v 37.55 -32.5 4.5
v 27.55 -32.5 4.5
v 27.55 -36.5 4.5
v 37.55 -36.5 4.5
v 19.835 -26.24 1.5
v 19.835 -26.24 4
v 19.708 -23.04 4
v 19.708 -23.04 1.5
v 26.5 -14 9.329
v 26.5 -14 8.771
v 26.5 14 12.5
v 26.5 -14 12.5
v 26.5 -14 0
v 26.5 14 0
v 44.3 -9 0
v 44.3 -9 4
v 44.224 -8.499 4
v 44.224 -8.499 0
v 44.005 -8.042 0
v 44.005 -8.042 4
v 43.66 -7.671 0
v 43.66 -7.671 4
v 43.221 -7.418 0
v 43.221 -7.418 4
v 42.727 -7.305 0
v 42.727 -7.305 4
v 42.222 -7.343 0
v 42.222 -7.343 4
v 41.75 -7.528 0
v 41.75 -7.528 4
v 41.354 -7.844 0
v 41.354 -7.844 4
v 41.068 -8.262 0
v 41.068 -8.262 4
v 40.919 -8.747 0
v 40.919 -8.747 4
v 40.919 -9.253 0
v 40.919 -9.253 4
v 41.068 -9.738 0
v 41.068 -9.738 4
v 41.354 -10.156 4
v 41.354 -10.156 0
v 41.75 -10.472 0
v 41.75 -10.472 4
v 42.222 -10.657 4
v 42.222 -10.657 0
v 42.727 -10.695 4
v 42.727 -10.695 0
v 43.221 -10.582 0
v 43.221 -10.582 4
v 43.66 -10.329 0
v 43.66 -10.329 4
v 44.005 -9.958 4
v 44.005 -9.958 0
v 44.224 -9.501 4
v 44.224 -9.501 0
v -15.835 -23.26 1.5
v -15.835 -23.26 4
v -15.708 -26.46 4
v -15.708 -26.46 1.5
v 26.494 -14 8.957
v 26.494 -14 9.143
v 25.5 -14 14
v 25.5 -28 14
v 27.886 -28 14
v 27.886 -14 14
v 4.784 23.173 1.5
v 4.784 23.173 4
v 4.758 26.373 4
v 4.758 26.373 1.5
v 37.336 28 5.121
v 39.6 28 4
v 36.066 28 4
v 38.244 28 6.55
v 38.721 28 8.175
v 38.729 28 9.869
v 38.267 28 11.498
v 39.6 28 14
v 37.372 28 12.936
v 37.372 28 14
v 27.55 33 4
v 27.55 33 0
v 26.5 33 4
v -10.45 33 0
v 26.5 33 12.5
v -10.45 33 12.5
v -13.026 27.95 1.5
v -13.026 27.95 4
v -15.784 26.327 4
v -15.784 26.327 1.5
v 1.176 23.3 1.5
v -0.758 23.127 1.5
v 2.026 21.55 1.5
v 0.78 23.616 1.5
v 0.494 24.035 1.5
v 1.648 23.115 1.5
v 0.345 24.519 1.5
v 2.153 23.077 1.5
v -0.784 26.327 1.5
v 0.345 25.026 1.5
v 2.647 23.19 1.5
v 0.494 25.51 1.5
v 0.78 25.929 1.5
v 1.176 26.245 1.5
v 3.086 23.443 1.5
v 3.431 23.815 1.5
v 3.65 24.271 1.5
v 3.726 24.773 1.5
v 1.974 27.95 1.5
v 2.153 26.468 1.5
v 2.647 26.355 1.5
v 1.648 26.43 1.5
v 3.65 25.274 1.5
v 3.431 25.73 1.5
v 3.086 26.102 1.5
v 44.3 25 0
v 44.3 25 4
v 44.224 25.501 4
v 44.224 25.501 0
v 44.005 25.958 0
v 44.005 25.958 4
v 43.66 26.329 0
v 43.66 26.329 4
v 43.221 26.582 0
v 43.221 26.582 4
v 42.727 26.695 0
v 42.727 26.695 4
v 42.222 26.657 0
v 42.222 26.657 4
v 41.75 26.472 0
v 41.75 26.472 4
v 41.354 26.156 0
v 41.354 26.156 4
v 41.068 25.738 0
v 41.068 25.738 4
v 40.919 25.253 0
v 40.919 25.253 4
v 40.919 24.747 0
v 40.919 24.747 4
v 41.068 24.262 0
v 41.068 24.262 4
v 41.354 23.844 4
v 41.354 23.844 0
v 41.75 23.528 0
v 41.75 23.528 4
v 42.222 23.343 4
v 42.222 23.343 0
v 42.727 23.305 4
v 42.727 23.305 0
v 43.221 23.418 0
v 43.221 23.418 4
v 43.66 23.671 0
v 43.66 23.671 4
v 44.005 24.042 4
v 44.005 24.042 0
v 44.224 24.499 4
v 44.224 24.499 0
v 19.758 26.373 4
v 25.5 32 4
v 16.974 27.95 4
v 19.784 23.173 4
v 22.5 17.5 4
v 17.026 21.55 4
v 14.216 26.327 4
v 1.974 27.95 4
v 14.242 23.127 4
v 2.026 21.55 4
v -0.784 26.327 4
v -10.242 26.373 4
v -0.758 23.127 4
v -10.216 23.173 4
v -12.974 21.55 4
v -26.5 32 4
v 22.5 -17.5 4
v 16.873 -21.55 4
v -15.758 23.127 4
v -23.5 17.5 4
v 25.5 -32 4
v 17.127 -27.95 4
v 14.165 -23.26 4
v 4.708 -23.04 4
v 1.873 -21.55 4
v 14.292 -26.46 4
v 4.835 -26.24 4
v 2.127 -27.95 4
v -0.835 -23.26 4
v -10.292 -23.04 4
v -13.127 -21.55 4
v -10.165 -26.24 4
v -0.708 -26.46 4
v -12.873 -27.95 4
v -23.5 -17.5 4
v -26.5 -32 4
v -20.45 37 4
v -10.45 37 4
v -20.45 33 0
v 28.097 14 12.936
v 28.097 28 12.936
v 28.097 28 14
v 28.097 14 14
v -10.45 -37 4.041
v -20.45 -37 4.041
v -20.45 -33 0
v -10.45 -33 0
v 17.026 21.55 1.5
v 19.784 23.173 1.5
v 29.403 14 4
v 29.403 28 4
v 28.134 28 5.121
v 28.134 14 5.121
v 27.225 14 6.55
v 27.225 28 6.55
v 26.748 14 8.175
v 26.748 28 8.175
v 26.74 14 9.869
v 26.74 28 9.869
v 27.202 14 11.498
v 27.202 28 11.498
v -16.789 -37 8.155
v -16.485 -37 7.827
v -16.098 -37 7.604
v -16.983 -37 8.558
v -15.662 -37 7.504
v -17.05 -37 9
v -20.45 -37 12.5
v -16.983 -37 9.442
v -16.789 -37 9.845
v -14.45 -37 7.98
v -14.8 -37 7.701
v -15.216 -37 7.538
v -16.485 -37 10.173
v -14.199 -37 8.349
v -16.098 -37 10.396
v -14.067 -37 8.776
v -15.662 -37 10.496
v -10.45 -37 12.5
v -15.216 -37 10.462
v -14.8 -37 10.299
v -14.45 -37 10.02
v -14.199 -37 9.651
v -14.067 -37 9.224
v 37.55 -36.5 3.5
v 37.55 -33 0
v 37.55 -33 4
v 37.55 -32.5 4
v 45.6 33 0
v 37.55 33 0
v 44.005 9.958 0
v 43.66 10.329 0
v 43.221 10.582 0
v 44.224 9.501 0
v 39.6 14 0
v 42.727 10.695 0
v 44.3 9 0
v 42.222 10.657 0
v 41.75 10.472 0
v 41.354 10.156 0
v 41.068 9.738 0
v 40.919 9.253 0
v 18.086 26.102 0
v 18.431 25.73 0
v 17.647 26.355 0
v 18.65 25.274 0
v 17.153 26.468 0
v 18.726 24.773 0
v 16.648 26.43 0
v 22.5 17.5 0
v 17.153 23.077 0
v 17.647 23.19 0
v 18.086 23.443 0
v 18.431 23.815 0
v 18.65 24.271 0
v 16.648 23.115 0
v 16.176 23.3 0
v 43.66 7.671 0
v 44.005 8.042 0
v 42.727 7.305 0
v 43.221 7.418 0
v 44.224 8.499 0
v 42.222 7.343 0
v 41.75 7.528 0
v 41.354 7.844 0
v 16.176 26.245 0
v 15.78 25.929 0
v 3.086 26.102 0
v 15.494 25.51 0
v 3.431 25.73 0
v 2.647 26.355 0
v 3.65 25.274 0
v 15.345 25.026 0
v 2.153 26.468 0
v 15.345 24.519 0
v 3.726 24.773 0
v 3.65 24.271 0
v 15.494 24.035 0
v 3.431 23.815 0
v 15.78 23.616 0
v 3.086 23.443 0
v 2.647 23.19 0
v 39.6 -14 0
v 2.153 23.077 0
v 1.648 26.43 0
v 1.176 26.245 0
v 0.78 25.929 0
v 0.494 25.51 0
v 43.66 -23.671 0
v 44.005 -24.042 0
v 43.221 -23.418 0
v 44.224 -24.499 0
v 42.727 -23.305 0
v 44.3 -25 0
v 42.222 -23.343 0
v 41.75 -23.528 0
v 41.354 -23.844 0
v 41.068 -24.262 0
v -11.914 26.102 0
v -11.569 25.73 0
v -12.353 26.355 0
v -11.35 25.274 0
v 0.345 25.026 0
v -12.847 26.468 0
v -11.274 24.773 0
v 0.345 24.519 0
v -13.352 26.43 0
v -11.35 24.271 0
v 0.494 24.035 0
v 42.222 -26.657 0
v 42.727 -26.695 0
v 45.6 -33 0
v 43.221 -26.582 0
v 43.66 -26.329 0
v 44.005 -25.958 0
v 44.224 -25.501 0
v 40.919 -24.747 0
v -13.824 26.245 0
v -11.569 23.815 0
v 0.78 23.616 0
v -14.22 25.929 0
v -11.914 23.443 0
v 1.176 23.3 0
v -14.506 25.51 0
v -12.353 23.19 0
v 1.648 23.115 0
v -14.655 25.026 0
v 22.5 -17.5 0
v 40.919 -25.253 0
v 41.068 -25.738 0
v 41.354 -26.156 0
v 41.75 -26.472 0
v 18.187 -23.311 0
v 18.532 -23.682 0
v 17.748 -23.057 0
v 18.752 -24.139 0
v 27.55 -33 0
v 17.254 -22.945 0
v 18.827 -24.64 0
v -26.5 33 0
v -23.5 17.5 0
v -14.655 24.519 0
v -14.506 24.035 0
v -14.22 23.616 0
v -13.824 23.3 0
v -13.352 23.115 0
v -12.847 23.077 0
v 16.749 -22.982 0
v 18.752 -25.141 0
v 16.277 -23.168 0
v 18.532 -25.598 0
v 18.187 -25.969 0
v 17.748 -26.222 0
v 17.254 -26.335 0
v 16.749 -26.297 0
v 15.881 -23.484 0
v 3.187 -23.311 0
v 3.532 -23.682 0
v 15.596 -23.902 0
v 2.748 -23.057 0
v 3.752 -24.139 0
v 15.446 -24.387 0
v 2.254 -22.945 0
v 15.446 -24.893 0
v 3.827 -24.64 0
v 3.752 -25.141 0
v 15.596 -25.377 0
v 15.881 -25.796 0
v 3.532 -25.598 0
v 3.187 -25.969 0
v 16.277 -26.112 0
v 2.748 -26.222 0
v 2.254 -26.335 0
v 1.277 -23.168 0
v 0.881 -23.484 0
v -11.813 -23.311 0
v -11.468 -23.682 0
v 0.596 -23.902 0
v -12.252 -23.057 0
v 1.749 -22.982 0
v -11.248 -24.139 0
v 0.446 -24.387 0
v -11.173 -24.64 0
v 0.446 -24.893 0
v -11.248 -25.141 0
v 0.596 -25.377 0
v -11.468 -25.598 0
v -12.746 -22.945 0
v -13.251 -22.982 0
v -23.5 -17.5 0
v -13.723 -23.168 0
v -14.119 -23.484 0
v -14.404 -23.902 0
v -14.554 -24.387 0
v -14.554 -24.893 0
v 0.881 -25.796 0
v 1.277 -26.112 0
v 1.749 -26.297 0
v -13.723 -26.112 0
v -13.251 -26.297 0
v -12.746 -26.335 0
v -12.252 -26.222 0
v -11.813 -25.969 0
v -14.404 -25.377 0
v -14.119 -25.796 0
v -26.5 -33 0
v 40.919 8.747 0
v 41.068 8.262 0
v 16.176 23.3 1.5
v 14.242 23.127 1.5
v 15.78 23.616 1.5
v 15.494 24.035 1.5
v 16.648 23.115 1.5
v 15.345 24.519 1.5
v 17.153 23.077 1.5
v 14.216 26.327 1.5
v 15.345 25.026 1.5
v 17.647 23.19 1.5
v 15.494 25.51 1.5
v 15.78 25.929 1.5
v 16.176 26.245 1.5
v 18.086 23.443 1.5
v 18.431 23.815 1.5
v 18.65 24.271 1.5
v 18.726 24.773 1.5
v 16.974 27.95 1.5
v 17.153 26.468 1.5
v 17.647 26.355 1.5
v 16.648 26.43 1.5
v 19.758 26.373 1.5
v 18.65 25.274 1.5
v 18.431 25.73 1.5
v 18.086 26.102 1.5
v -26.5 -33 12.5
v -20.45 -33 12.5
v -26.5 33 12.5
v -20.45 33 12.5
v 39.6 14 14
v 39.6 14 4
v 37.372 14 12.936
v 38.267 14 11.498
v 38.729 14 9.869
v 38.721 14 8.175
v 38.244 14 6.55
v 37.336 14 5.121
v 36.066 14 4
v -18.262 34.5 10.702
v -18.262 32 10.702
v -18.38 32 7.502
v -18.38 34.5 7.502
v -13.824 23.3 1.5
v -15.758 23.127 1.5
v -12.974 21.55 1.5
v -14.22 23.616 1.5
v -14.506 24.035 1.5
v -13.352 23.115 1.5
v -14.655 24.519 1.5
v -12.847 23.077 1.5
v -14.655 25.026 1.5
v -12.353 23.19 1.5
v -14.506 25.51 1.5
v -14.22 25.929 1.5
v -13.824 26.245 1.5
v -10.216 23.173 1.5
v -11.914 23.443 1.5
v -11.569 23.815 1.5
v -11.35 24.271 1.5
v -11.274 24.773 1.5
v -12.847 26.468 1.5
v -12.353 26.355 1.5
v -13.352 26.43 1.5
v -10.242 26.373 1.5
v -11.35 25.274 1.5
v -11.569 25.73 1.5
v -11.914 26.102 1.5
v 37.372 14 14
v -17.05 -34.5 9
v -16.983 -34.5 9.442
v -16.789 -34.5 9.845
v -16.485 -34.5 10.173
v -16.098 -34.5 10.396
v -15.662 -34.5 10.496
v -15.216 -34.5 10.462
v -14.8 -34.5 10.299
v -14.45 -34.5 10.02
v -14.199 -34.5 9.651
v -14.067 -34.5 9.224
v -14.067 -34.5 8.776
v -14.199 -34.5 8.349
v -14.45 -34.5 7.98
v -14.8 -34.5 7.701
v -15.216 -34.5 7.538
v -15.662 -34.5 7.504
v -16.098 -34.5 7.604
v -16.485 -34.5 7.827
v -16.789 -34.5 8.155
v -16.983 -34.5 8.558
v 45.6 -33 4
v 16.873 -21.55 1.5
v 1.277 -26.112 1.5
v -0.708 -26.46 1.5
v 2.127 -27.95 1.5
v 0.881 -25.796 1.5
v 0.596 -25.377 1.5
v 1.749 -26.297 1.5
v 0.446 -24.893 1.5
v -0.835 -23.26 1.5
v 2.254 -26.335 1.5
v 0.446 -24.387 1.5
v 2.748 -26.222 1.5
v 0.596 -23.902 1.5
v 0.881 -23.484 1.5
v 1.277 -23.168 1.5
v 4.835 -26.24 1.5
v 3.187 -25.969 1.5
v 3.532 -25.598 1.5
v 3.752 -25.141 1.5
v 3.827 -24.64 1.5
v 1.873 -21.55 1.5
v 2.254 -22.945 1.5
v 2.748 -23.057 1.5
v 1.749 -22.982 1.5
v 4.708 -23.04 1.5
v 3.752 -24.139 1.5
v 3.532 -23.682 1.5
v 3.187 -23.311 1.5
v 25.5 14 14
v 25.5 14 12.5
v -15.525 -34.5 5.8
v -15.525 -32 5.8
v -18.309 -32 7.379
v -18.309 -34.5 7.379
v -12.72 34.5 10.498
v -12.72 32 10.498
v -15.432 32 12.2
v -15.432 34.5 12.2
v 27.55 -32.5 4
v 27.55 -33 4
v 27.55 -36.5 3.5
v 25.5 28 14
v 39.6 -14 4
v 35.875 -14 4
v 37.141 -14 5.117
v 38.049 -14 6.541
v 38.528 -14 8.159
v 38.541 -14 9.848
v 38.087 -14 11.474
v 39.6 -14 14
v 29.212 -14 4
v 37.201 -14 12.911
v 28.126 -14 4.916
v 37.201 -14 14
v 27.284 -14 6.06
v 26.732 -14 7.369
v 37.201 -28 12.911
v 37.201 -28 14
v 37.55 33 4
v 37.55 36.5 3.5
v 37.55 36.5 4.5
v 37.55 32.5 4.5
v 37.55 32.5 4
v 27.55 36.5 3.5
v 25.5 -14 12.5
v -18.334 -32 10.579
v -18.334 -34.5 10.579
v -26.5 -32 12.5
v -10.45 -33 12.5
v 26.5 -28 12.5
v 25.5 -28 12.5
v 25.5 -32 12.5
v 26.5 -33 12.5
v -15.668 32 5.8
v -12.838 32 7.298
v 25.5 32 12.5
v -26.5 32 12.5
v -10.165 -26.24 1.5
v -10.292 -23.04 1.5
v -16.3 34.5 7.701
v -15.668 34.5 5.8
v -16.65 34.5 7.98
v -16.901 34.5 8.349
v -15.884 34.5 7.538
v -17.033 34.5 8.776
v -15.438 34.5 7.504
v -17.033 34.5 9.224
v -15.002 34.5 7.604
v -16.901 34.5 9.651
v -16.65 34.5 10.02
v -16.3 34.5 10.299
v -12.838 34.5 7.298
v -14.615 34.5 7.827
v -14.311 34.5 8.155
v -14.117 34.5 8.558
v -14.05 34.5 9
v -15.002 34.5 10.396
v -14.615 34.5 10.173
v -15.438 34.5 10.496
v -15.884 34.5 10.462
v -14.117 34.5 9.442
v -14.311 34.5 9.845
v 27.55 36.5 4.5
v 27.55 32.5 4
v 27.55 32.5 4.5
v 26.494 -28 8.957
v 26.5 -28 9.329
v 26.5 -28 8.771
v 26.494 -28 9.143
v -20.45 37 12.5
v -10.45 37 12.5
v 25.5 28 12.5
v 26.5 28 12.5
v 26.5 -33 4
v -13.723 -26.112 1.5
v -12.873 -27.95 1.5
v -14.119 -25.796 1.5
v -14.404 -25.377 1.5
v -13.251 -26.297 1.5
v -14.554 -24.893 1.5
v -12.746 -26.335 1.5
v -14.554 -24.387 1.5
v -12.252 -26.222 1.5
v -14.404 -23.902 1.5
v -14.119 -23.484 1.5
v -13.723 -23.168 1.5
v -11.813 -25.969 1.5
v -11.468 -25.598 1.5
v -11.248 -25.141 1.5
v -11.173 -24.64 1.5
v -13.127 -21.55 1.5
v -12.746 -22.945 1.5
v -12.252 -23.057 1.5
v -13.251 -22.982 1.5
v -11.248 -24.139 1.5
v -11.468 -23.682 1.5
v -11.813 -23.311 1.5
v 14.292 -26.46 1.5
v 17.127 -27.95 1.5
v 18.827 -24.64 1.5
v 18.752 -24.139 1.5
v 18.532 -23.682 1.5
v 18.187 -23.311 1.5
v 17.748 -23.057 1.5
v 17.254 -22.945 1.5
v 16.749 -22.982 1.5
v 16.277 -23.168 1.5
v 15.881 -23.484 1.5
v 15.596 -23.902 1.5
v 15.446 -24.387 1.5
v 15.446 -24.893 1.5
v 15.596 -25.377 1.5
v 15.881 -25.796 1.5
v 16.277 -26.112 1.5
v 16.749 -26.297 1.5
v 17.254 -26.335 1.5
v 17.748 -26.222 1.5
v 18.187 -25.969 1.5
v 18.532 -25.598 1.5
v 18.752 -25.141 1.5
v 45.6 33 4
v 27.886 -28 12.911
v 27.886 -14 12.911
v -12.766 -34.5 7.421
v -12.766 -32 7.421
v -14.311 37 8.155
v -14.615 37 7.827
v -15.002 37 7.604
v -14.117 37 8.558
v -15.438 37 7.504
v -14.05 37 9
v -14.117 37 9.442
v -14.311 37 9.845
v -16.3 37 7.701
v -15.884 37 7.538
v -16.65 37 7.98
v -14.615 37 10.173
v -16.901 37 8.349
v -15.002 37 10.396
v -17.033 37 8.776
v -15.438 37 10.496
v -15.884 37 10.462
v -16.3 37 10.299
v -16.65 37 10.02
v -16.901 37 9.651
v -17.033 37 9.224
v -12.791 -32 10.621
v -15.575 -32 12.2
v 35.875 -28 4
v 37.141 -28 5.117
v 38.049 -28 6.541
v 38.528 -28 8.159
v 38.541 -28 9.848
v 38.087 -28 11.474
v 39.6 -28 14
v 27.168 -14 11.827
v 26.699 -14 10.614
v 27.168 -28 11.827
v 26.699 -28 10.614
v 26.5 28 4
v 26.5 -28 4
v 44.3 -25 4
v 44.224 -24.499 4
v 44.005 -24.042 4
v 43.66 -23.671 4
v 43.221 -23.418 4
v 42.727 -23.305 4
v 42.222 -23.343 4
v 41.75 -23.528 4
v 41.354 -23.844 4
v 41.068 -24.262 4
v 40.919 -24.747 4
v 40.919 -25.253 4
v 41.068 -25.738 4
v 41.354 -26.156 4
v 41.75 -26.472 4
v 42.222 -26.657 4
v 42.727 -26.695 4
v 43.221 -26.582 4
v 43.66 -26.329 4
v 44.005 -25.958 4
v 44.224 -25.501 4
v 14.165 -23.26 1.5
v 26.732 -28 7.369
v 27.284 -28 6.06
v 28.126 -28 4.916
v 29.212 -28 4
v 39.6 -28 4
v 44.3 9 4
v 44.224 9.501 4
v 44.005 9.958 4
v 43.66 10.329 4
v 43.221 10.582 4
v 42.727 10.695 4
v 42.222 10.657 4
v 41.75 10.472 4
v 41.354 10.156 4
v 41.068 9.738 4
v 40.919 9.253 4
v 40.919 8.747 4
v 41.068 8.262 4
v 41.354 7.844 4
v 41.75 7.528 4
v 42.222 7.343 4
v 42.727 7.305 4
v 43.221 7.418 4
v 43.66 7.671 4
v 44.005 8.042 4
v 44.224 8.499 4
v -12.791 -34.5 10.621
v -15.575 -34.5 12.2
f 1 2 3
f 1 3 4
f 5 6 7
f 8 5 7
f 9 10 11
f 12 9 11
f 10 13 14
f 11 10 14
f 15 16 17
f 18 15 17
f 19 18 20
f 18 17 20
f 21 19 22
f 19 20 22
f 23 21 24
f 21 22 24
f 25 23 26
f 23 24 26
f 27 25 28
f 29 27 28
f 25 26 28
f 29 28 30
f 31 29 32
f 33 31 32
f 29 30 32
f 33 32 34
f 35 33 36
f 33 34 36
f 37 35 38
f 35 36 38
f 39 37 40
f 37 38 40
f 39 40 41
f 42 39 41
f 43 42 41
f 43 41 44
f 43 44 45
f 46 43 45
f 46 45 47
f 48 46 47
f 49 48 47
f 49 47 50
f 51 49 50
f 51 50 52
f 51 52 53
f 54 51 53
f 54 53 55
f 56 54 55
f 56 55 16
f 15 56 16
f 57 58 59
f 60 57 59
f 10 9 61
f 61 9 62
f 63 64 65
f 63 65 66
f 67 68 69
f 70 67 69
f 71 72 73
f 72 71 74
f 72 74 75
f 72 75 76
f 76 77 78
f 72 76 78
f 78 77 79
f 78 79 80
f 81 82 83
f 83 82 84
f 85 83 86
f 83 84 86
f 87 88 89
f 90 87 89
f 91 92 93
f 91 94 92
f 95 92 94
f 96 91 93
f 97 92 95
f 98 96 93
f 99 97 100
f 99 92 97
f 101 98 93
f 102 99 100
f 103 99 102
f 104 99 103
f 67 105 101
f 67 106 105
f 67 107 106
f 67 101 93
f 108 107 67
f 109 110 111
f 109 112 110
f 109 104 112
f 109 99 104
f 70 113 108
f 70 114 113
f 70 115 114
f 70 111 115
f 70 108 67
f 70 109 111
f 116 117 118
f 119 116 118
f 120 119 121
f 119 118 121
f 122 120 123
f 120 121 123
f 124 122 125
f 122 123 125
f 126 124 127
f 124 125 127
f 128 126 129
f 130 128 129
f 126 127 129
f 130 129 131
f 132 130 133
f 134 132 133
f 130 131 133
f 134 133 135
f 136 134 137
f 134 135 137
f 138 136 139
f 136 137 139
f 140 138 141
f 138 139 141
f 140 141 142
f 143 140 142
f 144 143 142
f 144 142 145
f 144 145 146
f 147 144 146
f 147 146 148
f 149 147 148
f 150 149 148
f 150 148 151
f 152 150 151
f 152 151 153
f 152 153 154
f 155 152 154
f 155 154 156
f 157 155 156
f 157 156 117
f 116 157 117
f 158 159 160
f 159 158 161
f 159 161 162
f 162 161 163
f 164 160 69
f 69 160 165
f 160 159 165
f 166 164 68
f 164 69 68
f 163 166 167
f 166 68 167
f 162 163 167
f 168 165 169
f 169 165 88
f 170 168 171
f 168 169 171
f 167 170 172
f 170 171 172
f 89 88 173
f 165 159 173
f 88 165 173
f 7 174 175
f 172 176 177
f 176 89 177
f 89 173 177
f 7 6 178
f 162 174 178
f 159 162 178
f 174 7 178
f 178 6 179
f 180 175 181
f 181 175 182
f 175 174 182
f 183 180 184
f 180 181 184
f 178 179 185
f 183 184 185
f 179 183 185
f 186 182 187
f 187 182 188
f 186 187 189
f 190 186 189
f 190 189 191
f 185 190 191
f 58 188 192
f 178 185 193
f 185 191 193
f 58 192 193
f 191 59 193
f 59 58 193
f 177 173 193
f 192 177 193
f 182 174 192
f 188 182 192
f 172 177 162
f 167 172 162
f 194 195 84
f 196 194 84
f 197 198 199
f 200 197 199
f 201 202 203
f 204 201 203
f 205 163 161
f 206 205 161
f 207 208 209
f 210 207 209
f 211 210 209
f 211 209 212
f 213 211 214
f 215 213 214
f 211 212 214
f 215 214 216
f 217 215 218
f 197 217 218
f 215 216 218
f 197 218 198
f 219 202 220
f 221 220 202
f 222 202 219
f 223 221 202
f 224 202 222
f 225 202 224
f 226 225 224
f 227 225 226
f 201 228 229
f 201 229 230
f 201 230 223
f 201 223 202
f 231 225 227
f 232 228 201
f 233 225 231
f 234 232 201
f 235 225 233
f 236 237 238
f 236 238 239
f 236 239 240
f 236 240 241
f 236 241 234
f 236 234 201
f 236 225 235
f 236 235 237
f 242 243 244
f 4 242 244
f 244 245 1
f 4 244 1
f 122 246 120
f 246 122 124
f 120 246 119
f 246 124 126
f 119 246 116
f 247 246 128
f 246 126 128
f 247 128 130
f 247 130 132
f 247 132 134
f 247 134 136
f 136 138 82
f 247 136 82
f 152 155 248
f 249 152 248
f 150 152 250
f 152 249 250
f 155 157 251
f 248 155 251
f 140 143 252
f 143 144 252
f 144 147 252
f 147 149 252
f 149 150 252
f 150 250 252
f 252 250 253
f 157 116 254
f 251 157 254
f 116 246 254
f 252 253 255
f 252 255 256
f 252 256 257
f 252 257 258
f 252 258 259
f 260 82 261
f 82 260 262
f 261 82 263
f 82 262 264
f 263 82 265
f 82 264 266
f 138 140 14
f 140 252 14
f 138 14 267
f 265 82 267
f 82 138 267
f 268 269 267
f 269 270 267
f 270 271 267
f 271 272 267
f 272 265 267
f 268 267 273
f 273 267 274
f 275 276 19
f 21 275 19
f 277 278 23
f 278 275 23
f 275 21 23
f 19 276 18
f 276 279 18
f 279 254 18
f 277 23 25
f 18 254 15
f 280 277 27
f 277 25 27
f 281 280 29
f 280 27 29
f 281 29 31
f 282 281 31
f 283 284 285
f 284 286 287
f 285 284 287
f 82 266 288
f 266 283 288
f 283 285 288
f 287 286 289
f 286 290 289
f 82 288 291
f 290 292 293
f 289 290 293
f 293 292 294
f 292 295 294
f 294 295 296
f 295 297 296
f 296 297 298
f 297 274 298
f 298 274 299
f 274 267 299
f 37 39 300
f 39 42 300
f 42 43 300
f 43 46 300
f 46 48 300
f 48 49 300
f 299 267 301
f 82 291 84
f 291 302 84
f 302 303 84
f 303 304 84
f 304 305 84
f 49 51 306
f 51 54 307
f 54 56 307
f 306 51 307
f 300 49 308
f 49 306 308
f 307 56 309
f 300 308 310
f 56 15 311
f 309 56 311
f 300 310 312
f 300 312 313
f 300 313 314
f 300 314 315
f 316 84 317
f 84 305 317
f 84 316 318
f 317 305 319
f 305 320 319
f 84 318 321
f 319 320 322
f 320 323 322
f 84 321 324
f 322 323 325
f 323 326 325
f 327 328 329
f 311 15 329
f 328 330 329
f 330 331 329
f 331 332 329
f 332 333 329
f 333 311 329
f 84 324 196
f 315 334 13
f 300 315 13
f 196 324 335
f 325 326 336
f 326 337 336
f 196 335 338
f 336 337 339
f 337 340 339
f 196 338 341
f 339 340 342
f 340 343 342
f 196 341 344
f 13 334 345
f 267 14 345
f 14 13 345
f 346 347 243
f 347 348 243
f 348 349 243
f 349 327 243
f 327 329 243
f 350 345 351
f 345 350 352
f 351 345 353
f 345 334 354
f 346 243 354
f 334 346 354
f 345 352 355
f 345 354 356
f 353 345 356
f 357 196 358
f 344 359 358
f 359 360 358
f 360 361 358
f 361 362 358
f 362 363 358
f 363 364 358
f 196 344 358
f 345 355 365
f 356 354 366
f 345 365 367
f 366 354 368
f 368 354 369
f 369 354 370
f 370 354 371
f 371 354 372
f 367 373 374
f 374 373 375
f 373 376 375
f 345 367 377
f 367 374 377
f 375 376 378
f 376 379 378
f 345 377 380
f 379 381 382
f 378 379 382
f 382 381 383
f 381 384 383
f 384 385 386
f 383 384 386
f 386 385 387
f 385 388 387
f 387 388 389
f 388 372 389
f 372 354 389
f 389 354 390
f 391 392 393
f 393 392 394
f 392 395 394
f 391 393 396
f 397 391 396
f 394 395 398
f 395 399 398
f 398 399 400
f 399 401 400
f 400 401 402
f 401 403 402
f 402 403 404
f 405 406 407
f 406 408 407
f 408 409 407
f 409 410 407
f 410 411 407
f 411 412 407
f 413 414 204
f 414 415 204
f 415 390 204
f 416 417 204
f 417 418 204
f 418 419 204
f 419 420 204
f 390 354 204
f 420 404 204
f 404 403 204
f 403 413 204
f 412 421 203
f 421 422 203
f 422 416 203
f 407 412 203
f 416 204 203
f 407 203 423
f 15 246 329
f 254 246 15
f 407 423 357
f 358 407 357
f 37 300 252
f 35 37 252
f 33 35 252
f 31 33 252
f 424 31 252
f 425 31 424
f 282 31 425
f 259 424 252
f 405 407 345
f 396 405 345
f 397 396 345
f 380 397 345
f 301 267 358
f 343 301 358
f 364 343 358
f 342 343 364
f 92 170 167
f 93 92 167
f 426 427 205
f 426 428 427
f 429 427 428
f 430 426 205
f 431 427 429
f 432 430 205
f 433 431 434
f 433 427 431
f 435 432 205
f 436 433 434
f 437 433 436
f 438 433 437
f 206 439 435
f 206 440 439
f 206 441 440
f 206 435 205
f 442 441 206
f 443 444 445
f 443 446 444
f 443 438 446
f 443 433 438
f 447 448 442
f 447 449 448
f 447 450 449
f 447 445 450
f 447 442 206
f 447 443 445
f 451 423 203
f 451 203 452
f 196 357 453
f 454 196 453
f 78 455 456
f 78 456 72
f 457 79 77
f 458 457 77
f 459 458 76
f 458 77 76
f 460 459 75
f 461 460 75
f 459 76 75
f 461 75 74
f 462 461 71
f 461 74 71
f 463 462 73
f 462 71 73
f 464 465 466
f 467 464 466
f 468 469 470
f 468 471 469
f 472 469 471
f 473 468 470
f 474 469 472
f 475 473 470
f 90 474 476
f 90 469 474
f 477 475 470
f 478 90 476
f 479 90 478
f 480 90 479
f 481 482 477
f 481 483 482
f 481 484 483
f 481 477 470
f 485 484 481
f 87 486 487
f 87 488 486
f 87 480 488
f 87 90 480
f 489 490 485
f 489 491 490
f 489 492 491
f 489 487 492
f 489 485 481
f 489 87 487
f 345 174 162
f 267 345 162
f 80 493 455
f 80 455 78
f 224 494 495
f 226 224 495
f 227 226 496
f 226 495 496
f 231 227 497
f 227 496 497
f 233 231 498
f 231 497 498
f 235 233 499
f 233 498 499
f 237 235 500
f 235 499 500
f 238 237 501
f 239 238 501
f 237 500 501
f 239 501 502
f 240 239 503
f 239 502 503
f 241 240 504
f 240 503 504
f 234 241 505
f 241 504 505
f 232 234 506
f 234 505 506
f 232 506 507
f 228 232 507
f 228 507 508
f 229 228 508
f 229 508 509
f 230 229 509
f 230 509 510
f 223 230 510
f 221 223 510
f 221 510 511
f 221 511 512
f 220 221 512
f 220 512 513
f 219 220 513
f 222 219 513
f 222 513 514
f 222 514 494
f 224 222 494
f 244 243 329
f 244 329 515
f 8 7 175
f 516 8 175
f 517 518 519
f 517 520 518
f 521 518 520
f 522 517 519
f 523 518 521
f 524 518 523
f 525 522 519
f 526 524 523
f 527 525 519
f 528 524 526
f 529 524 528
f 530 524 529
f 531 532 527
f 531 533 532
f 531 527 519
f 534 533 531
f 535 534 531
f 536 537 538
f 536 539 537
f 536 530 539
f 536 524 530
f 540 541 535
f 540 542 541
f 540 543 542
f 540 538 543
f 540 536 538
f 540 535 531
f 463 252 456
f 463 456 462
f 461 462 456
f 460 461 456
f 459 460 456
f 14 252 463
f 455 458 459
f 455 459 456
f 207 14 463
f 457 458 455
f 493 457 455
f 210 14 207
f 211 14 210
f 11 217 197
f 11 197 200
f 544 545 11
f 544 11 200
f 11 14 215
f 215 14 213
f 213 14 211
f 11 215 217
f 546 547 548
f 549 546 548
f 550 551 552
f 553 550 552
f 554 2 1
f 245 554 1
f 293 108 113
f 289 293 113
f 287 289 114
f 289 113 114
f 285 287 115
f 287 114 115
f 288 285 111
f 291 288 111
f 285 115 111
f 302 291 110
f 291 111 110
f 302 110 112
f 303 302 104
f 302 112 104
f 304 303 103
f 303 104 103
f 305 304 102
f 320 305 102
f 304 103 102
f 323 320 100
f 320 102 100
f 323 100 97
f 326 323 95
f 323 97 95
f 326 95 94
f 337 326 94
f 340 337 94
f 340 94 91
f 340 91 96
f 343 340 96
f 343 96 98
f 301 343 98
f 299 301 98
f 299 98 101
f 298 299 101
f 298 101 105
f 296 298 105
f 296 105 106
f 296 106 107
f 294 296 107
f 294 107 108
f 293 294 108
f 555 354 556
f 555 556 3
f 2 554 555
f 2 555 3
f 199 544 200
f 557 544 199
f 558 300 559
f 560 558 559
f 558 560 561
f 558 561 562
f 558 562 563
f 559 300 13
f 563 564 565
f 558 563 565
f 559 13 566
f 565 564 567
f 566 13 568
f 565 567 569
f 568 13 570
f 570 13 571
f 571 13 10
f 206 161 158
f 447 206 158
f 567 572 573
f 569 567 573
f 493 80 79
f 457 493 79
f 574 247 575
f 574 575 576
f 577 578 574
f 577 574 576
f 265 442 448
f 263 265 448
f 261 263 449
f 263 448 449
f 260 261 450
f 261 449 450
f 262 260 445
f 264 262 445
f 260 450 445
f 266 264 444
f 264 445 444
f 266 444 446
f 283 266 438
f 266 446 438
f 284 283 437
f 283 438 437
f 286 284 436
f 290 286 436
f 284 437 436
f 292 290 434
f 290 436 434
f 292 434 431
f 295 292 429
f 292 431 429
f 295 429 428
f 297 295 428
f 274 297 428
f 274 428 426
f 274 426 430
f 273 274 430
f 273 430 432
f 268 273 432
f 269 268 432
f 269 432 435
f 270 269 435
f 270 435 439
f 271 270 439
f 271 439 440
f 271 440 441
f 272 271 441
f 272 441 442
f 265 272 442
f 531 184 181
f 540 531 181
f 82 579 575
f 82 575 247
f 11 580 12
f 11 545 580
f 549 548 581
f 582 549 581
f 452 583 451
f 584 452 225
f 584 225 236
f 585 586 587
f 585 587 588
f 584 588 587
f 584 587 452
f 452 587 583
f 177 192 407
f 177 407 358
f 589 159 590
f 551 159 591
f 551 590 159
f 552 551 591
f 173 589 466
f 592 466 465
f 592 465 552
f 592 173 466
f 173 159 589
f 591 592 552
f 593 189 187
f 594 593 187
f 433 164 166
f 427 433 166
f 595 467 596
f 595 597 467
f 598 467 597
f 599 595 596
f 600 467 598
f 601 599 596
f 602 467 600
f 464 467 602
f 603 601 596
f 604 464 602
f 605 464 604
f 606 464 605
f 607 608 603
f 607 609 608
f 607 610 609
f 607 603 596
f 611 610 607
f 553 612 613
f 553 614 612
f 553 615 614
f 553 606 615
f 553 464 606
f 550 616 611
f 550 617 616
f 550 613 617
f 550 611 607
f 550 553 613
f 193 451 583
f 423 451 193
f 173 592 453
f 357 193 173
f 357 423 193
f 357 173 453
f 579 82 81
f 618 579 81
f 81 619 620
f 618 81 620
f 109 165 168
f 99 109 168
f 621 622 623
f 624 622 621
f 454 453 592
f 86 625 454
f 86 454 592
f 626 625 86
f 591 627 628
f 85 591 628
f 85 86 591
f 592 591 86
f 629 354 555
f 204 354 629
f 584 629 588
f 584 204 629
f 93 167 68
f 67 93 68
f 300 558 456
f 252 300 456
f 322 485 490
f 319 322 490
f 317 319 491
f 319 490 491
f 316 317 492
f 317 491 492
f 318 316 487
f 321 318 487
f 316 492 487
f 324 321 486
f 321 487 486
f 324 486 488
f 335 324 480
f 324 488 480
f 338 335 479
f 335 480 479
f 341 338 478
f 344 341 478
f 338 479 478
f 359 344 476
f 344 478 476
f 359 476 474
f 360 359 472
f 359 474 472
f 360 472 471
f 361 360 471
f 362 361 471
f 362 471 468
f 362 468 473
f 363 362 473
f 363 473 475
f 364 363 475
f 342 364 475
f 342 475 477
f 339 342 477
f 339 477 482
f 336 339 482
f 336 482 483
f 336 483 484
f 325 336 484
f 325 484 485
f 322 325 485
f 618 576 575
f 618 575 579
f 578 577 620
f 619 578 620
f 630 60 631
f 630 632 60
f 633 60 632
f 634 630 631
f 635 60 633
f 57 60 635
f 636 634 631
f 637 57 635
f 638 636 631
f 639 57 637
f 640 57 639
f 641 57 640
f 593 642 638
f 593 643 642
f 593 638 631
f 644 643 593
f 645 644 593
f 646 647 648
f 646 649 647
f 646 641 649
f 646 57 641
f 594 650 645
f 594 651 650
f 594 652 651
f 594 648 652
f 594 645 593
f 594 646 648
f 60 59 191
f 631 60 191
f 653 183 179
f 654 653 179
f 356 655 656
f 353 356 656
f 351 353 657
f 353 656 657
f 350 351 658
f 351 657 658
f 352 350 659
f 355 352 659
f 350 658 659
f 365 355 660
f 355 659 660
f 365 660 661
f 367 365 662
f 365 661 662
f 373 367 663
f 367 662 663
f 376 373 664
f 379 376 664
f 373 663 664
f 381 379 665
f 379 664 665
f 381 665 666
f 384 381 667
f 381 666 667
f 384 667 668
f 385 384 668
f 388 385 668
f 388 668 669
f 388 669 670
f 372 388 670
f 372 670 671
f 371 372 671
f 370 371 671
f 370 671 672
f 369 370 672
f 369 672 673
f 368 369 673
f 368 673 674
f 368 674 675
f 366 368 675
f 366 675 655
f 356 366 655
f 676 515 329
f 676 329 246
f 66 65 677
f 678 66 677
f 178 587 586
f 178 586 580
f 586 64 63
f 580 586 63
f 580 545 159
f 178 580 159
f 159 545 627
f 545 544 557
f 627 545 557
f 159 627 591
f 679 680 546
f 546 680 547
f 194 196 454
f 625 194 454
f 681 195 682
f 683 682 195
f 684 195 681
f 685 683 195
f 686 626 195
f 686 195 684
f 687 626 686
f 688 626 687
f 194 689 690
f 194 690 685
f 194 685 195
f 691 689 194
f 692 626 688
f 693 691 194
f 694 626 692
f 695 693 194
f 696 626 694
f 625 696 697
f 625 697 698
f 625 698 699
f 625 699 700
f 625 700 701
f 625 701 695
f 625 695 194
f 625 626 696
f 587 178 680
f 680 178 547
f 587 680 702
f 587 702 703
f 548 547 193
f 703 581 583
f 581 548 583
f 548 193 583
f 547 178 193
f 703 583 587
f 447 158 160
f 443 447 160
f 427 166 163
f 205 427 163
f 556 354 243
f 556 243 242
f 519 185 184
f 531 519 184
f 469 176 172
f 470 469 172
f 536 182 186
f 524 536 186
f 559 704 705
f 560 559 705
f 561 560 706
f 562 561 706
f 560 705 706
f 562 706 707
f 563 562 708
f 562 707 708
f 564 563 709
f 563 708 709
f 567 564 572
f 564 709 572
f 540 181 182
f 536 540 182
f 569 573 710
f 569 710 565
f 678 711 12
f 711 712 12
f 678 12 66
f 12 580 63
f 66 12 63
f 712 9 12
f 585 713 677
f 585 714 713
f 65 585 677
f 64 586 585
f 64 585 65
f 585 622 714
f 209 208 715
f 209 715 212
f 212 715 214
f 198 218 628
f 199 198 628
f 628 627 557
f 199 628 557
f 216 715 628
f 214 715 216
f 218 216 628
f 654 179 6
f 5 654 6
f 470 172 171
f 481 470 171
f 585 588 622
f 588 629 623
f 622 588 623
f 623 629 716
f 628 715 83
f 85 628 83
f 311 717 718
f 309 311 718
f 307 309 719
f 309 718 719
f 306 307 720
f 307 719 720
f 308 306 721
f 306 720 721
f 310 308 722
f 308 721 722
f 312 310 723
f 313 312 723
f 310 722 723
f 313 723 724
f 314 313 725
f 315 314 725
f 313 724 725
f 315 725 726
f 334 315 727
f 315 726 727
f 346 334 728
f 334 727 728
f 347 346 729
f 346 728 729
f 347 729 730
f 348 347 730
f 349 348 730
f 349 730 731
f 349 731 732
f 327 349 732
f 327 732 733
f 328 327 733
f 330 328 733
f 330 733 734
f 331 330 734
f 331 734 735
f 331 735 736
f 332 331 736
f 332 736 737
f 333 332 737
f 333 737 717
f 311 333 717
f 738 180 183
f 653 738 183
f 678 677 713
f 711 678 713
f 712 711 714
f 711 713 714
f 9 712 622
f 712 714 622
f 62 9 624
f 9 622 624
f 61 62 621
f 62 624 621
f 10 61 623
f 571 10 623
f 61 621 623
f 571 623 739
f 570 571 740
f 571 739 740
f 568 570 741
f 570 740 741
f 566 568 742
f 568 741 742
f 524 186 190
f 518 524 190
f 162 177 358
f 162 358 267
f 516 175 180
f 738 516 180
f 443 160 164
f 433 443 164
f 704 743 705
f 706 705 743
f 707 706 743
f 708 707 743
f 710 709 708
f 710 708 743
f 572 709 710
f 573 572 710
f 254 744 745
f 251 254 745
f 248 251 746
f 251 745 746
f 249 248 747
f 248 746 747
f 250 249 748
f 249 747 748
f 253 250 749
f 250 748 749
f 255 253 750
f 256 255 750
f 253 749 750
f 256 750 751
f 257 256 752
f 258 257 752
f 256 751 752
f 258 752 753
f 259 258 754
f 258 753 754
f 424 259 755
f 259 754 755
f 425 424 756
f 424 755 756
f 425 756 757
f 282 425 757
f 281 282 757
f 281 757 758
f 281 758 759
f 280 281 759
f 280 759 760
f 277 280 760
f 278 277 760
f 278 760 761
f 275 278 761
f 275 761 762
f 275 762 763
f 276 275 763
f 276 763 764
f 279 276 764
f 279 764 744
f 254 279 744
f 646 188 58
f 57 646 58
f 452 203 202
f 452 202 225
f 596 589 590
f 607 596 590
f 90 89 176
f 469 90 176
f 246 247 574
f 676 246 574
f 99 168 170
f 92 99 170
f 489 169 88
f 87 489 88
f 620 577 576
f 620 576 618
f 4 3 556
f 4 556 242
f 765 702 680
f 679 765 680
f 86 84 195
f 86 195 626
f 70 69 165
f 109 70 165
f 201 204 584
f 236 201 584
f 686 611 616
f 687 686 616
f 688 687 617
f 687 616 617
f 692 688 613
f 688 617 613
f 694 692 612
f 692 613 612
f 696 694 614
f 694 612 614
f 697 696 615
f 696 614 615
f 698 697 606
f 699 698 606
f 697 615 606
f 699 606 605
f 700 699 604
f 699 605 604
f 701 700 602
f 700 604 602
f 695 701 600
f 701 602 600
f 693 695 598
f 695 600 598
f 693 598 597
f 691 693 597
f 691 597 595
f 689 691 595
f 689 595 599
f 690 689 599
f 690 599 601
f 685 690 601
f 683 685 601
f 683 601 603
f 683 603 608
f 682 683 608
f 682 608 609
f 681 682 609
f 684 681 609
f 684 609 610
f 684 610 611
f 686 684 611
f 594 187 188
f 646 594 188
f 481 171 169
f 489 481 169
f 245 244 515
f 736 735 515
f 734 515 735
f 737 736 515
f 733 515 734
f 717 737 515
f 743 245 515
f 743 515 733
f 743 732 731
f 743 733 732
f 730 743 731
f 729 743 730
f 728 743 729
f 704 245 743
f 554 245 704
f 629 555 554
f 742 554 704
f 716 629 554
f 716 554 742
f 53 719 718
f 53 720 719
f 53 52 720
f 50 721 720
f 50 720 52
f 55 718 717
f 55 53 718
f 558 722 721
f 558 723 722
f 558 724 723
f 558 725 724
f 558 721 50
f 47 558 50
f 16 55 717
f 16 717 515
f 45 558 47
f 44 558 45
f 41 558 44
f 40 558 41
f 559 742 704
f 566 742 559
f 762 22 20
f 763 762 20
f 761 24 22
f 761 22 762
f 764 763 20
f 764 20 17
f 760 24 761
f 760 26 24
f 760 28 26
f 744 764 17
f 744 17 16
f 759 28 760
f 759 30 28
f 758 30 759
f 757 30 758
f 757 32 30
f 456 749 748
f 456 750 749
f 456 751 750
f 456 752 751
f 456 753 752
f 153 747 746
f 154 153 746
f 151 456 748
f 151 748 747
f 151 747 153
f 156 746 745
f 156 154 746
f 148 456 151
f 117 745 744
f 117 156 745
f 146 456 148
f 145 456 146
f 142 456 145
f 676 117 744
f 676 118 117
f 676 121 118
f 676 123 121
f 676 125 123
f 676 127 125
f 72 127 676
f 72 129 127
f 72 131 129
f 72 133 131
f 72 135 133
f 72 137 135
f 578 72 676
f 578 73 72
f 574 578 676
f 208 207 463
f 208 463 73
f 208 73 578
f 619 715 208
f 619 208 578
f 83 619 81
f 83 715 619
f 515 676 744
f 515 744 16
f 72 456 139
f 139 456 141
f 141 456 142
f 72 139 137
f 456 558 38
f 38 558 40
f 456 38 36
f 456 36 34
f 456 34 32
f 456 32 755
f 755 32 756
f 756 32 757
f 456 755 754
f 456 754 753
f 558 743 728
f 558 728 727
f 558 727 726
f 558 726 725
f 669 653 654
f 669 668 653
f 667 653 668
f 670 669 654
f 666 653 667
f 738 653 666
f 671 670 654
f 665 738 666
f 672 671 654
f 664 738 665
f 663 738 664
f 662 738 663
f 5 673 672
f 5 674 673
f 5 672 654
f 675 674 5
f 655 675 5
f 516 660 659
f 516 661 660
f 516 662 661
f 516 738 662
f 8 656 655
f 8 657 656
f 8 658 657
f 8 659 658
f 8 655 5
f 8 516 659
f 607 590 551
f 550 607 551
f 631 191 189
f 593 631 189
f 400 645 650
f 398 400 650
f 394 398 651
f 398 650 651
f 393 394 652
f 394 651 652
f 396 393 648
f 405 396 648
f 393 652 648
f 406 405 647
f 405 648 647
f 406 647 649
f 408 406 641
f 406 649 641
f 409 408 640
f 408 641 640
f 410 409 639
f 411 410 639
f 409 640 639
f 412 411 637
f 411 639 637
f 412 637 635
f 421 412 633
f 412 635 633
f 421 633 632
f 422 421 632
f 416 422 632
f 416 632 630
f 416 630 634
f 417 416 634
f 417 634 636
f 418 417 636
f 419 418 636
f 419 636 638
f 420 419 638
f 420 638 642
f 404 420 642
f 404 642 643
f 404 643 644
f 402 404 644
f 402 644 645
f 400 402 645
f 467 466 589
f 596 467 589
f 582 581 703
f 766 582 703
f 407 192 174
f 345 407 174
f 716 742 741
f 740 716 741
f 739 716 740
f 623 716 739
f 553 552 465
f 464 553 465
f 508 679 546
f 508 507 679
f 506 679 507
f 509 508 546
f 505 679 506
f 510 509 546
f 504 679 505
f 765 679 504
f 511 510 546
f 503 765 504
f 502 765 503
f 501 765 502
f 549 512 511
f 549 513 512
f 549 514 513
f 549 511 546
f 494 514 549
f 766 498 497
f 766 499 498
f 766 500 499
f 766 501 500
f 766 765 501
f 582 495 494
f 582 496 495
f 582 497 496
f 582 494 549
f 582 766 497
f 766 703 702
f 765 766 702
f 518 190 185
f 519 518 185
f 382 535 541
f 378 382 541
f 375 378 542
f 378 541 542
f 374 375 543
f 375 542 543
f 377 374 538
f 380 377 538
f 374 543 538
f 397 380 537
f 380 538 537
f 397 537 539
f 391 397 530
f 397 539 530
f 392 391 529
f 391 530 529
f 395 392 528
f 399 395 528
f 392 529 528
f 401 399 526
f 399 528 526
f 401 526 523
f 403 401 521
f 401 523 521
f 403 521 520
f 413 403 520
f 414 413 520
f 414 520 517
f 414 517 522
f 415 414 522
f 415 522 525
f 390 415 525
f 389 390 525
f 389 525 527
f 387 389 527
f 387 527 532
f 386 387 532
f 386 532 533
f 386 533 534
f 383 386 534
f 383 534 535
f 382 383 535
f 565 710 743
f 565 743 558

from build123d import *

# Parameters (mm, degrees)
F0_W           = 53
F0_H           = 66
F1_DEPTH       = 12.5
F2_W           = 64
F2_H           = 8.5
F3_DEPTH       = 52
F4_W           = 46
F4_H           = 35
F5_DEPTH       = 5
F6_W           = 14
F6_H           = 12.5
F7_DEPTH       = 1
F8_W           = 14
F8_H           = 14
F9_DEPTH       = 14.1
F11_DEPTH      = 14
F12_W          = 14
F12_H          = 14
F13_DEPTH      = 1
F13_DEPTH_BACK = 13.1
F15_DEPTH      = 14
F16_W          = 5
F16_H          = 4
F17_DEPTH      = 13.1
F18_W          = 5
F18_H          = 4
F19_DEPTH      = 13.1
F20_W          = 66
F20_H          = 4
F21_DEPTH      = 6
F22_W          = 10
F22_H          = 4.5
F23_DEPTH      = 0.5
F23_DEPTH_BACK = 3.5
F25_DEPTH      = 10
F26_W          = 10
F26_H          = 12.5
F27_DEPTH      = 4
F29_DEPTH      = 10
F30_W          = 10
F30_H          = 4.5
F31_DEPTH      = 0.5
F31_DEPTH_BACK = 3.5
F33_DEPTH      = 10
F34_W          = 10
F34_H          = 12.5
F35_DEPTH      = 4
F37_DEPTH      = 10
F39_DEPTH      = 2.5
F40_R          = 1.5
F41_DEPTH      = 6
F43_DEPTH      = 2.5
F44_R          = 1.5
F45_DEPTH      = 6
F46_R          = 1.7
F47_DEPTH      = 5
F49_DEPTH      = 2.5
F50_R          = 1.7
F51_DEPTH      = 6


with BuildPart() as f1:
    # F0 (on Top) → F1 (new body)
    with BuildSketch(Plane.XY):
        Rectangle(F0_W, F0_H)
    extrude(amount=F1_DEPTH)

    # F2 (on face) → F3 (cut)
    with BuildSketch(Plane(origin=(-26.5, 0, 0), x_dir=(0, -1, 0), z_dir=(-1, 0, 0))):
        with Locations((0, 8.25)):
            Rectangle(F2_W, F2_H)
    extrude(amount=-F3_DEPTH, mode=Mode.SUBTRACT)

    # F4 (on face) → F5 (cut)
    with BuildSketch(Plane.XY.offset(4)):
        with Locations((-0.5, 0)):
            Rectangle(F4_W, F4_H)
    extrude(amount=-F5_DEPTH, mode=Mode.SUBTRACT)

    # F6 (on face) → F7 (cut)
    with BuildSketch(Plane.YZ.offset(26.5)):
        with Locations((-21, 6.25)):
            Rectangle(F6_W, F6_H)
    extrude(amount=-F7_DEPTH, mode=Mode.SUBTRACT)

    # F8 (on face) → F9 (join)
    with BuildSketch(Plane.YZ.offset(25.5)):
        with Locations((-21, 7)):
            Rectangle(F8_W, F8_H)
    extrude(amount=F9_DEPTH)

    # F10 (on face) → F11 (cut)
    with BuildSketch(Plane.XZ.offset(28)):
        with BuildLine():
            Line((27.8857629746, 14), (27.8857629746, 12.911010872))
            ThreePointArc((27.8857629746, 12.911010872), (26.5594651822, 8.159449016), (29.2118961029, 4))
            Line((29.2118961029, 4), (35.8752286024, 4))
            ThreePointArc((35.8752286024, 4), (38.5276595231, 8.159449016), (37.2013617307, 12.911010872))
            Line((37.2013617307, 12.911010872), (37.2013617307, 14))
            Line((37.2013617307, 14), (27.8857629746, 14))
        make_face()
    extrude(amount=-F11_DEPTH, mode=Mode.SUBTRACT)

    # F12 (on face) → F13 (join, two sides)
    with BuildSketch(Plane.YZ.offset(26.5)) as f13_sk:
        with Locations((21, 7)):
            Rectangle(F12_W, F12_H)
    extrude(amount=-F13_DEPTH)
    extrude(f13_sk.sketch, amount=F13_DEPTH_BACK)

    # F14 (on face) → F15 (cut)
    with BuildSketch(Plane(origin=(0, 28, 0), x_dir=(-1, 0, 0), z_dir=(0, 1, 0))):
        with BuildLine():
            Line((-37.3720750213, 14), (-37.3720750213, 12.935615631))
            ThreePointArc((-37.3720750213, 12.935615631), (-38.7212150513, 8.175292403), (-36.0664477535, 4))
            Line((-36.0664477535, 4), (-29.4031152539, 4))
            ThreePointArc((-29.4031152539, 4), (-26.7483479561, 8.175292403), (-28.0974879861, 12.935615631))
            Line((-28.0974879861, 12.935615631), (-28.0974879861, 14))
            Line((-28.0974879861, 14), (-37.3720750213, 14))
        make_face()
    extrude(amount=-F15_DEPTH, mode=Mode.SUBTRACT)

    # F16 (on face) → F17 (join, through all)
    with BuildSketch(Plane.YZ.offset(26.5)):
        with Locations((-30.5, 2)):
            Rectangle(F16_W, F16_H)
    extrude(amount=F17_DEPTH)

    # F18 (on face) → F19 (join, through all)
    with BuildSketch(Plane.YZ.offset(26.5)):
        with Locations((30.5, 2)):
            Rectangle(F18_W, F18_H)
    extrude(amount=F19_DEPTH)

    # F20 (on face) → F21 (join)
    with BuildSketch(Plane.YZ.offset(39.6)):
        with Locations((0, 2)):
            Rectangle(F20_W, F20_H)
    extrude(amount=F21_DEPTH)

    # F22 (on face) → F23 (join, two sides)
    with BuildSketch(Plane.XZ.offset(33)) as f23_sk:
        with Locations((32.55, 2.25)):
            Rectangle(F22_W, F22_H)
    extrude(amount=-F23_DEPTH)
    extrude(f23_sk.sketch, amount=F23_DEPTH_BACK)

    # F24 (on face) → F25 (cut)
    with BuildSketch(Plane.YZ.offset(37.55)):
        Polygon((-36.5, 0), (-33, 0), (-36.5, 3.5), align=None)
    extrude(amount=-F25_DEPTH, mode=Mode.SUBTRACT)

    # F26 (on face) → F27 (join)
    with BuildSketch(Plane.XZ.offset(33)):
        with Locations((-15.45, 6.25)):
            Rectangle(F26_W, F26_H)
    extrude(amount=F27_DEPTH)

    # F28 (on face) → F29 (cut, through all)
    with BuildSketch(Plane(origin=(-20.45, 0, 0), x_dir=(0, -1, 0), z_dir=(-1, 0, 0))):
        Polygon((33, 0), (37, 0), (37, 4.0411888622), align=None)
    extrude(amount=-F29_DEPTH, mode=Mode.SUBTRACT)

    # F30 (on face) → F31 (join, two sides)
    with BuildSketch(Plane(origin=(0, 33, 0), x_dir=(-1, 0, 0), z_dir=(0, 1, 0))) as f31_sk:
        with Locations((-32.55, 2.25)):
            Rectangle(F30_W, F30_H)
    extrude(amount=-F31_DEPTH)
    extrude(f31_sk.sketch, amount=F31_DEPTH_BACK)

    # F32 (on face) → F33 (cut, through all)
    with BuildSketch(Plane.YZ.offset(37.55)):
        Polygon((36.5, 3.5), (33, 0), (36.5, 0), align=None)
    extrude(amount=-F33_DEPTH, mode=Mode.SUBTRACT)

    # F34 (on face) → F35 (join)
    with BuildSketch(Plane(origin=(0, 33, 0), x_dir=(-1, 0, 0), z_dir=(0, 1, 0))):
        with Locations((15.45, 6.25)):
            Rectangle(F34_W, F34_H)
    extrude(amount=F35_DEPTH)

    # F36 (on face) → F37 (cut, through all)
    with BuildSketch(Plane.YZ.offset(-10.45)):
        Polygon((37, 4), (33, 0), (37, 0), align=None)
    extrude(amount=-F37_DEPTH, mode=Mode.SUBTRACT)

    # F38 (on face) → F39 (cut)
    with BuildSketch(Plane(origin=(0, -32, 0), x_dir=(-1, 0, 0), z_dir=(0, 1, 0))):
        Polygon((15.5747217333, 12.2), (12.7910795745, 10.6214096491), (12.7663578412, 7.4214096491), (15.5252782667, 5.8), (18.3089204255, 7.3785903509), (18.3336421588, 10.5785903509), align=None)
    extrude(amount=-F39_DEPTH, mode=Mode.SUBTRACT)

    # F40 (on face) → F41 (cut)
    with BuildSketch(Plane(origin=(0, -32, 0), x_dir=(-1, 0, 0), z_dir=(0, 1, 0))):
        with Locations((15.55, 9)):
            Circle(F40_R)
    extrude(amount=-F41_DEPTH, mode=Mode.SUBTRACT)

    # F42 (on face) → F43 (cut)
    with BuildSketch(Plane.XZ.offset(-32)):
        Polygon((-15.6680351614, 5.8), (-12.8377362886, 7.2977785517), (-12.7197011272, 10.4977785517), (-15.4319648386, 12.2), (-18.2622637114, 10.7022214483), (-18.3802988728, 7.5022214483), align=None)
    extrude(amount=-F43_DEPTH, mode=Mode.SUBTRACT)

    # F44 (on face) → F45 (cut)
    with BuildSketch(Plane.XZ.offset(-32)):
        with Locations((-15.55, 9)):
            Circle(F44_R)
    extrude(amount=-F45_DEPTH, mode=Mode.SUBTRACT)

    # F46 (on face) → F47 (cut)
    with BuildSketch(Plane.XY.offset(4)):
        with Locations((42.6, -25)):
            Circle(F46_R)
        with Locations((42.6, -9)):
            Circle(F46_R)
        with Locations((42.6, 9)):
            Circle(F46_R)
        with Locations((42.6, 25)):
            Circle(F46_R)
    extrude(amount=-F47_DEPTH, mode=Mode.SUBTRACT)

    # F48 (on face) → F49 (cut)
    with BuildSketch(Plane.XY.offset(4)):
        Polygon((-12.9739972428, 21.55), (-10.2157173293, 23.1725190483), (-10.2417200865, 26.3725190483), (-13.0260027572, 27.95), (-15.7842826707, 26.3274809517), (-15.7582799135, 23.1274809517), align=None)
        Polygon((2.0260027572, 21.55), (4.7842826707, 23.1725190483), (4.7582799135, 26.3725190483), (1.9739972428, 27.95), (-0.7842826707, 26.3274809517), (-0.7582799135, 23.1274809517), align=None)
        Polygon((17.0260027572, 21.55), (19.7842826707, 23.1725190483), (19.7582799135, 26.3725190483), (16.9739972428, 27.95), (14.2157173293, 26.3274809517), (14.2417200865, 23.1274809517), align=None)
        Polygon((-12.8728363868, -27.95), (-10.1651369013, -26.2398730805), (-10.2923005145, -23.0398730805), (-13.1271636132, -21.55), (-15.8348630987, -23.2601269195), (-15.7076994855, -26.4601269195), align=None)
        Polygon((2.1271636132, -27.95), (4.8348630987, -26.2398730805), (4.7076994855, -23.0398730805), (1.8728363868, -21.55), (-0.8348630987, -23.2601269195), (-0.7076994855, -26.4601269195), align=None)
        Polygon((17.1271636132, -27.95), (19.8348630987, -26.2398730805), (19.7076994855, -23.0398730805), (16.8728363868, -21.55), (14.1651369013, -23.2601269195), (14.2923005145, -26.4601269195), align=None)
    extrude(amount=-F49_DEPTH, mode=Mode.SUBTRACT)

    # F50 (on face) → F51 (cut)
    with BuildSketch(Plane.XY.offset(4)):
        with Locations((-12.9739972428, 24.7725190483)):
            Circle(F50_R)
        with Locations((2.0260027572, 24.7725190483)):
            Circle(F50_R)
        with Locations((17.0260027572, 24.7725190483)):
            Circle(F50_R)
        with Locations((17.1271636132, -24.6398730805)):
            Circle(F50_R)
        with Locations((2.1271636132, -24.6398730805)):
            Circle(F50_R)
        with Locations((-12.8728363868, -24.6398730805)):
            Circle(F50_R)
    extrude(amount=-F51_DEPTH, mode=Mode.SUBTRACT)


solid = f1.part
